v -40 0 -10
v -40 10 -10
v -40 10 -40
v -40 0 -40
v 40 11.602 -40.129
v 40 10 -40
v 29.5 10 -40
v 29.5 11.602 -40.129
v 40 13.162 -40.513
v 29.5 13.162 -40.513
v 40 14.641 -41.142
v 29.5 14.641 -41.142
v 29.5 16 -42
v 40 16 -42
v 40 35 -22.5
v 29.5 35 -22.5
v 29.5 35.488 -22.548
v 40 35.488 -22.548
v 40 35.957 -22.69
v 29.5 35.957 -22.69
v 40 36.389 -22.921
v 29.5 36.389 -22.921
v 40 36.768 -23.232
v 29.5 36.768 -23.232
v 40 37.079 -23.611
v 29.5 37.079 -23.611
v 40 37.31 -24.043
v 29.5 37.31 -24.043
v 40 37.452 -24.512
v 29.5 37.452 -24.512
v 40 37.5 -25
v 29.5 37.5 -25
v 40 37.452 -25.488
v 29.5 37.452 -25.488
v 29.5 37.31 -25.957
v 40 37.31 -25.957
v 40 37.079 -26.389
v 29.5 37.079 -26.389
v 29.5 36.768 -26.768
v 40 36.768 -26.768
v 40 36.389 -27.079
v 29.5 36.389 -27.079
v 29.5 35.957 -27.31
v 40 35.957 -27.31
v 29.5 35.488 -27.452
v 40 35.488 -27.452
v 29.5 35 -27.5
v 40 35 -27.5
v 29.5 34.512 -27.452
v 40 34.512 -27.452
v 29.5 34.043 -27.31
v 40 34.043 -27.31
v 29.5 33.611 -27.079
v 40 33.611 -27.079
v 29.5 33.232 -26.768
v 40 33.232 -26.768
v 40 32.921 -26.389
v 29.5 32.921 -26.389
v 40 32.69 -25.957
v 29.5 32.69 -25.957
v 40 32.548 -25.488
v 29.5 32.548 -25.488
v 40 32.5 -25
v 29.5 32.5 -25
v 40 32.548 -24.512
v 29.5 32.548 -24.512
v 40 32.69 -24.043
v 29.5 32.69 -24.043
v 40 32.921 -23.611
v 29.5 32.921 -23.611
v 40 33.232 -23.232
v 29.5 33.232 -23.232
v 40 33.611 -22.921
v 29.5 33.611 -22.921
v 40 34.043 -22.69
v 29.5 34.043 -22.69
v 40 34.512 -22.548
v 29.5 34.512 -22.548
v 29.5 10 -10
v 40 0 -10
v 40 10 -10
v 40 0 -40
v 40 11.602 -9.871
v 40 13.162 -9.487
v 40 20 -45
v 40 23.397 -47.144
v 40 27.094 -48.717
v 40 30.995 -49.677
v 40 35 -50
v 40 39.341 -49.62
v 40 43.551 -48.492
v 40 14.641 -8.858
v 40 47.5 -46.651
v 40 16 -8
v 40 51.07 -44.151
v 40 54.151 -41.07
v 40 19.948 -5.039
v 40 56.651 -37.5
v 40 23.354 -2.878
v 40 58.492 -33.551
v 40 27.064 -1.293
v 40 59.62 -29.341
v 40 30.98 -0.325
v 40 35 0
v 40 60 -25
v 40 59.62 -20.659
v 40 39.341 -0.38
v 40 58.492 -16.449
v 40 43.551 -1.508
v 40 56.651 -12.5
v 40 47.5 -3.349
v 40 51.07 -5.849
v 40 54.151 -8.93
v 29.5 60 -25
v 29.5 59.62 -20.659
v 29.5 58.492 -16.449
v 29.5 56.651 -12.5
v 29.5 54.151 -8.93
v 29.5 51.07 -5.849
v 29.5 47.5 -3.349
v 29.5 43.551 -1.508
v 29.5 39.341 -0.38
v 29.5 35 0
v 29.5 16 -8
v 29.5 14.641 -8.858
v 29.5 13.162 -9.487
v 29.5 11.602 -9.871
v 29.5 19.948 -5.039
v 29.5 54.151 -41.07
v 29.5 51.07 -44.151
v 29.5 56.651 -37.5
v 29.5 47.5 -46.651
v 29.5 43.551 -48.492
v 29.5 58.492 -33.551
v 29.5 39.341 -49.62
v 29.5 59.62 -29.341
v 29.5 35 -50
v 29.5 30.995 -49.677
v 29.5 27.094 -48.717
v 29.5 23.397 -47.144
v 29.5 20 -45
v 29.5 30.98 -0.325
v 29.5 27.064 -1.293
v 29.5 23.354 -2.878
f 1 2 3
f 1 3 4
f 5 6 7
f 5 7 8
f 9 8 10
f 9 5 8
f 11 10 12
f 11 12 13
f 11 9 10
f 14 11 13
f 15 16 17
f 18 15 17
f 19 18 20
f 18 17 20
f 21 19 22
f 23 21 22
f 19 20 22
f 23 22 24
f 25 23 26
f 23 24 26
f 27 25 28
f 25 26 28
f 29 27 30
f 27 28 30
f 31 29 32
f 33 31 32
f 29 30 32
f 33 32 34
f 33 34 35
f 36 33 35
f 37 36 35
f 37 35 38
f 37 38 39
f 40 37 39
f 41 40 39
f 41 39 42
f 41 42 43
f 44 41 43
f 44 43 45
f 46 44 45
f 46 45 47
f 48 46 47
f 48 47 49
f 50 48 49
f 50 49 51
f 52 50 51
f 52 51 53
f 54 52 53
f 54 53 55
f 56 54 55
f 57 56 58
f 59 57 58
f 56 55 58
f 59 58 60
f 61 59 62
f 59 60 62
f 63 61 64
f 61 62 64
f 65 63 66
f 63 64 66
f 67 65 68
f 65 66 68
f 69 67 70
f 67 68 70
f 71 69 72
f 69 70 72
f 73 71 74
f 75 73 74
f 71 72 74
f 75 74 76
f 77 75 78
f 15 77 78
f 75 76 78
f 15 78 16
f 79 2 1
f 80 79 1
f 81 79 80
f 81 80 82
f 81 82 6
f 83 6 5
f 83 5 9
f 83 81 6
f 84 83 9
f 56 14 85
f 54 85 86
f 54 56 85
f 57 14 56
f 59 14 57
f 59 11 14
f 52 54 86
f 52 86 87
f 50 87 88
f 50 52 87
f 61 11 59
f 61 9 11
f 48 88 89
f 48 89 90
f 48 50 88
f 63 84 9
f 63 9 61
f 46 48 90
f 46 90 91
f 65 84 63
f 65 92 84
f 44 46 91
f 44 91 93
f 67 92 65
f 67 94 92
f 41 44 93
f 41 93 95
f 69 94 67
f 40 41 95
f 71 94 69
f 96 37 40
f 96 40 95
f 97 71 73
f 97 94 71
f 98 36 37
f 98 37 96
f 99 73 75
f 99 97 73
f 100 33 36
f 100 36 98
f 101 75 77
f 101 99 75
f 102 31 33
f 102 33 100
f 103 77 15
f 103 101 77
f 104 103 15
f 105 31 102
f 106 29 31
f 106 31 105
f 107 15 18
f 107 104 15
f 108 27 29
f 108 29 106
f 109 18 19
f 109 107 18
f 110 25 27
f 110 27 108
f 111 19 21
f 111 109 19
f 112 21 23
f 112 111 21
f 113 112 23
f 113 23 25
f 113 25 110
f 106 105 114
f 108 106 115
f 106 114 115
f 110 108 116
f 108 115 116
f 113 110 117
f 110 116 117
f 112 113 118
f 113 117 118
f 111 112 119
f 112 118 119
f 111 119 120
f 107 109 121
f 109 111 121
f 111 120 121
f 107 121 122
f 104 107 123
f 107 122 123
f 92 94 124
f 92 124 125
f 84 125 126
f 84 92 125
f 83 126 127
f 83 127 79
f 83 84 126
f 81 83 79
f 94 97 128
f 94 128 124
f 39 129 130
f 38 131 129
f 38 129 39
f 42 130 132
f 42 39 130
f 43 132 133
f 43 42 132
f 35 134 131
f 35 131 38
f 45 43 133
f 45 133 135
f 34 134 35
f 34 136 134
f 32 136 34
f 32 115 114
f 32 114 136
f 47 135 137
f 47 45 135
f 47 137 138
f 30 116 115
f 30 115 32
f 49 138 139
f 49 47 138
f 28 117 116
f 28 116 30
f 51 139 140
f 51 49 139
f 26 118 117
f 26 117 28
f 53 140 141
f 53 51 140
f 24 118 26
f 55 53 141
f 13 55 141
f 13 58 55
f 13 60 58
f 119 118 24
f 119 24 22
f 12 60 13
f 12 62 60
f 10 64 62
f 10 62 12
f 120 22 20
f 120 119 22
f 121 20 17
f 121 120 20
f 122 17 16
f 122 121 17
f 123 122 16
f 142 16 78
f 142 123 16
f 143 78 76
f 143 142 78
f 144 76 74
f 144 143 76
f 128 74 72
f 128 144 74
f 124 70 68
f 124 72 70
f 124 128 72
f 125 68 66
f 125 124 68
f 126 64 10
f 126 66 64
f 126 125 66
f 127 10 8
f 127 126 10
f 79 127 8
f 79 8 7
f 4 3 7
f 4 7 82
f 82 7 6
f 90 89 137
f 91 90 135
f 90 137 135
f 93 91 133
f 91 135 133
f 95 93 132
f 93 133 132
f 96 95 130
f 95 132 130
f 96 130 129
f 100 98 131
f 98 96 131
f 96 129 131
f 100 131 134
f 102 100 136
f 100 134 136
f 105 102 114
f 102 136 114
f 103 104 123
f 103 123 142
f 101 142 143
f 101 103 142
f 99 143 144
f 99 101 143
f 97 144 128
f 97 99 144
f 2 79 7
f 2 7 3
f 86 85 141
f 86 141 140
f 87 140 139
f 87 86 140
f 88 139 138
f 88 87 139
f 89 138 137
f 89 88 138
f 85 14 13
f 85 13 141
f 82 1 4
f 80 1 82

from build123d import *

# Parameters (mm, degrees)
BOSS_EXTRUDE1_DEPTH = 50
CUT_EXTRUDE1_DEPTH  = 105.547835941
SKETCH3_R           = 2.5
CUT_EXTRUDE2_DEPTH  = 105.547835941
SKETCH4_W           = 80
SKETCH4_H           = 10
CUT_EXTRUDE3_DEPTH  = 82.240384046
CUT_EXTRUDE4_START  = -10.5
CUT_EXTRUDE4_DEPTH  = 10.5


# Read off the part's stored shape, not the designer's step: Cut-Extrude4
with BuildPart() as part:
    # Sketch1 → Boss-Extrude1 (new body)
    with BuildSketch(Plane.XY):
        Polygon((29.5, 60), (29.5, 10), (-40, 10), (-40, 0), (40, 0), (40, 60), align=None)
    extrude(amount=-BOSS_EXTRUDE1_DEPTH)

    # Sketch2 → Cut-Extrude1 (cut, through all)
    with BuildSketch(Plane.ZY.offset(-29.5)):
        with BuildLine():
            Line((-50, 60), (-50, 35))
            ThreePointArc((-50, 35), (-42.67766953, 52.67766953), (-25, 60))
            Line((-25, 60), (-50, 60))
        make_face()
        with BuildLine():
            Line((0, 60), (-25, 60))
            ThreePointArc((-25, 60), (-7.32233047, 52.67766953), (0, 35))
            Line((0, 35), (0, 60))
        make_face()
    extrude(amount=-CUT_EXTRUDE1_DEPTH, mode=Mode.SUBTRACT)

    # Sketch3 → Cut-Extrude2 (cut, through all)
    with BuildSketch(Plane.ZY.offset(-29.5)):
        with Locations((-25, 35)):
            Circle(SKETCH3_R)
    extrude(amount=-CUT_EXTRUDE2_DEPTH, mode=Mode.SUBTRACT)

    # Sketch4 → Cut-Extrude3 (cut, through all)
    with BuildSketch(Plane(origin=(0, 10, 0), x_dir=(1, 0, 0), z_dir=(0, 1, 0))):
        with Locations((0, 45)):
            Rectangle(SKETCH4_W, SKETCH4_H)
        with Locations((0, 5)):
            Rectangle(SKETCH4_W, SKETCH4_H)
    extrude(amount=-CUT_EXTRUDE3_DEPTH, mode=Mode.SUBTRACT)

    # Cut-Extrude4 outline → Cut-Extrude4 (cut)
    with BuildSketch(Plane.ZY.offset(-29.5).offset(CUT_EXTRUDE4_START)):
        with BuildLine():
            ThreePointArc((-45, 20), (-48.717082451, 27.09430585), (-50, 35))
            Line((-50, 35), (-50, 10))
            Line((-50, 10), (-40, 10))
            ThreePointArc((-40, 10), (-40.513167019, 13.16227766), (-42, 16))
            Line((-42, 16), (-45, 20))
        make_face()
        with BuildLine():
            ThreePointArc((0, 35), (-1.293142852, 27.063695813), (-5.038793932, 19.948413628))
            Line((-5.038793932, 19.948413628), (-8, 16))
            ThreePointArc((-8, 16), (-9.486832981, 13.16227766), (-10, 10))
            Line((-10, 10), (0, 10))
            Line((0, 10), (0, 35))
        make_face()
    extrude(amount=CUT_EXTRUDE4_DEPTH, mode=Mode.SUBTRACT)


solid = part.part
